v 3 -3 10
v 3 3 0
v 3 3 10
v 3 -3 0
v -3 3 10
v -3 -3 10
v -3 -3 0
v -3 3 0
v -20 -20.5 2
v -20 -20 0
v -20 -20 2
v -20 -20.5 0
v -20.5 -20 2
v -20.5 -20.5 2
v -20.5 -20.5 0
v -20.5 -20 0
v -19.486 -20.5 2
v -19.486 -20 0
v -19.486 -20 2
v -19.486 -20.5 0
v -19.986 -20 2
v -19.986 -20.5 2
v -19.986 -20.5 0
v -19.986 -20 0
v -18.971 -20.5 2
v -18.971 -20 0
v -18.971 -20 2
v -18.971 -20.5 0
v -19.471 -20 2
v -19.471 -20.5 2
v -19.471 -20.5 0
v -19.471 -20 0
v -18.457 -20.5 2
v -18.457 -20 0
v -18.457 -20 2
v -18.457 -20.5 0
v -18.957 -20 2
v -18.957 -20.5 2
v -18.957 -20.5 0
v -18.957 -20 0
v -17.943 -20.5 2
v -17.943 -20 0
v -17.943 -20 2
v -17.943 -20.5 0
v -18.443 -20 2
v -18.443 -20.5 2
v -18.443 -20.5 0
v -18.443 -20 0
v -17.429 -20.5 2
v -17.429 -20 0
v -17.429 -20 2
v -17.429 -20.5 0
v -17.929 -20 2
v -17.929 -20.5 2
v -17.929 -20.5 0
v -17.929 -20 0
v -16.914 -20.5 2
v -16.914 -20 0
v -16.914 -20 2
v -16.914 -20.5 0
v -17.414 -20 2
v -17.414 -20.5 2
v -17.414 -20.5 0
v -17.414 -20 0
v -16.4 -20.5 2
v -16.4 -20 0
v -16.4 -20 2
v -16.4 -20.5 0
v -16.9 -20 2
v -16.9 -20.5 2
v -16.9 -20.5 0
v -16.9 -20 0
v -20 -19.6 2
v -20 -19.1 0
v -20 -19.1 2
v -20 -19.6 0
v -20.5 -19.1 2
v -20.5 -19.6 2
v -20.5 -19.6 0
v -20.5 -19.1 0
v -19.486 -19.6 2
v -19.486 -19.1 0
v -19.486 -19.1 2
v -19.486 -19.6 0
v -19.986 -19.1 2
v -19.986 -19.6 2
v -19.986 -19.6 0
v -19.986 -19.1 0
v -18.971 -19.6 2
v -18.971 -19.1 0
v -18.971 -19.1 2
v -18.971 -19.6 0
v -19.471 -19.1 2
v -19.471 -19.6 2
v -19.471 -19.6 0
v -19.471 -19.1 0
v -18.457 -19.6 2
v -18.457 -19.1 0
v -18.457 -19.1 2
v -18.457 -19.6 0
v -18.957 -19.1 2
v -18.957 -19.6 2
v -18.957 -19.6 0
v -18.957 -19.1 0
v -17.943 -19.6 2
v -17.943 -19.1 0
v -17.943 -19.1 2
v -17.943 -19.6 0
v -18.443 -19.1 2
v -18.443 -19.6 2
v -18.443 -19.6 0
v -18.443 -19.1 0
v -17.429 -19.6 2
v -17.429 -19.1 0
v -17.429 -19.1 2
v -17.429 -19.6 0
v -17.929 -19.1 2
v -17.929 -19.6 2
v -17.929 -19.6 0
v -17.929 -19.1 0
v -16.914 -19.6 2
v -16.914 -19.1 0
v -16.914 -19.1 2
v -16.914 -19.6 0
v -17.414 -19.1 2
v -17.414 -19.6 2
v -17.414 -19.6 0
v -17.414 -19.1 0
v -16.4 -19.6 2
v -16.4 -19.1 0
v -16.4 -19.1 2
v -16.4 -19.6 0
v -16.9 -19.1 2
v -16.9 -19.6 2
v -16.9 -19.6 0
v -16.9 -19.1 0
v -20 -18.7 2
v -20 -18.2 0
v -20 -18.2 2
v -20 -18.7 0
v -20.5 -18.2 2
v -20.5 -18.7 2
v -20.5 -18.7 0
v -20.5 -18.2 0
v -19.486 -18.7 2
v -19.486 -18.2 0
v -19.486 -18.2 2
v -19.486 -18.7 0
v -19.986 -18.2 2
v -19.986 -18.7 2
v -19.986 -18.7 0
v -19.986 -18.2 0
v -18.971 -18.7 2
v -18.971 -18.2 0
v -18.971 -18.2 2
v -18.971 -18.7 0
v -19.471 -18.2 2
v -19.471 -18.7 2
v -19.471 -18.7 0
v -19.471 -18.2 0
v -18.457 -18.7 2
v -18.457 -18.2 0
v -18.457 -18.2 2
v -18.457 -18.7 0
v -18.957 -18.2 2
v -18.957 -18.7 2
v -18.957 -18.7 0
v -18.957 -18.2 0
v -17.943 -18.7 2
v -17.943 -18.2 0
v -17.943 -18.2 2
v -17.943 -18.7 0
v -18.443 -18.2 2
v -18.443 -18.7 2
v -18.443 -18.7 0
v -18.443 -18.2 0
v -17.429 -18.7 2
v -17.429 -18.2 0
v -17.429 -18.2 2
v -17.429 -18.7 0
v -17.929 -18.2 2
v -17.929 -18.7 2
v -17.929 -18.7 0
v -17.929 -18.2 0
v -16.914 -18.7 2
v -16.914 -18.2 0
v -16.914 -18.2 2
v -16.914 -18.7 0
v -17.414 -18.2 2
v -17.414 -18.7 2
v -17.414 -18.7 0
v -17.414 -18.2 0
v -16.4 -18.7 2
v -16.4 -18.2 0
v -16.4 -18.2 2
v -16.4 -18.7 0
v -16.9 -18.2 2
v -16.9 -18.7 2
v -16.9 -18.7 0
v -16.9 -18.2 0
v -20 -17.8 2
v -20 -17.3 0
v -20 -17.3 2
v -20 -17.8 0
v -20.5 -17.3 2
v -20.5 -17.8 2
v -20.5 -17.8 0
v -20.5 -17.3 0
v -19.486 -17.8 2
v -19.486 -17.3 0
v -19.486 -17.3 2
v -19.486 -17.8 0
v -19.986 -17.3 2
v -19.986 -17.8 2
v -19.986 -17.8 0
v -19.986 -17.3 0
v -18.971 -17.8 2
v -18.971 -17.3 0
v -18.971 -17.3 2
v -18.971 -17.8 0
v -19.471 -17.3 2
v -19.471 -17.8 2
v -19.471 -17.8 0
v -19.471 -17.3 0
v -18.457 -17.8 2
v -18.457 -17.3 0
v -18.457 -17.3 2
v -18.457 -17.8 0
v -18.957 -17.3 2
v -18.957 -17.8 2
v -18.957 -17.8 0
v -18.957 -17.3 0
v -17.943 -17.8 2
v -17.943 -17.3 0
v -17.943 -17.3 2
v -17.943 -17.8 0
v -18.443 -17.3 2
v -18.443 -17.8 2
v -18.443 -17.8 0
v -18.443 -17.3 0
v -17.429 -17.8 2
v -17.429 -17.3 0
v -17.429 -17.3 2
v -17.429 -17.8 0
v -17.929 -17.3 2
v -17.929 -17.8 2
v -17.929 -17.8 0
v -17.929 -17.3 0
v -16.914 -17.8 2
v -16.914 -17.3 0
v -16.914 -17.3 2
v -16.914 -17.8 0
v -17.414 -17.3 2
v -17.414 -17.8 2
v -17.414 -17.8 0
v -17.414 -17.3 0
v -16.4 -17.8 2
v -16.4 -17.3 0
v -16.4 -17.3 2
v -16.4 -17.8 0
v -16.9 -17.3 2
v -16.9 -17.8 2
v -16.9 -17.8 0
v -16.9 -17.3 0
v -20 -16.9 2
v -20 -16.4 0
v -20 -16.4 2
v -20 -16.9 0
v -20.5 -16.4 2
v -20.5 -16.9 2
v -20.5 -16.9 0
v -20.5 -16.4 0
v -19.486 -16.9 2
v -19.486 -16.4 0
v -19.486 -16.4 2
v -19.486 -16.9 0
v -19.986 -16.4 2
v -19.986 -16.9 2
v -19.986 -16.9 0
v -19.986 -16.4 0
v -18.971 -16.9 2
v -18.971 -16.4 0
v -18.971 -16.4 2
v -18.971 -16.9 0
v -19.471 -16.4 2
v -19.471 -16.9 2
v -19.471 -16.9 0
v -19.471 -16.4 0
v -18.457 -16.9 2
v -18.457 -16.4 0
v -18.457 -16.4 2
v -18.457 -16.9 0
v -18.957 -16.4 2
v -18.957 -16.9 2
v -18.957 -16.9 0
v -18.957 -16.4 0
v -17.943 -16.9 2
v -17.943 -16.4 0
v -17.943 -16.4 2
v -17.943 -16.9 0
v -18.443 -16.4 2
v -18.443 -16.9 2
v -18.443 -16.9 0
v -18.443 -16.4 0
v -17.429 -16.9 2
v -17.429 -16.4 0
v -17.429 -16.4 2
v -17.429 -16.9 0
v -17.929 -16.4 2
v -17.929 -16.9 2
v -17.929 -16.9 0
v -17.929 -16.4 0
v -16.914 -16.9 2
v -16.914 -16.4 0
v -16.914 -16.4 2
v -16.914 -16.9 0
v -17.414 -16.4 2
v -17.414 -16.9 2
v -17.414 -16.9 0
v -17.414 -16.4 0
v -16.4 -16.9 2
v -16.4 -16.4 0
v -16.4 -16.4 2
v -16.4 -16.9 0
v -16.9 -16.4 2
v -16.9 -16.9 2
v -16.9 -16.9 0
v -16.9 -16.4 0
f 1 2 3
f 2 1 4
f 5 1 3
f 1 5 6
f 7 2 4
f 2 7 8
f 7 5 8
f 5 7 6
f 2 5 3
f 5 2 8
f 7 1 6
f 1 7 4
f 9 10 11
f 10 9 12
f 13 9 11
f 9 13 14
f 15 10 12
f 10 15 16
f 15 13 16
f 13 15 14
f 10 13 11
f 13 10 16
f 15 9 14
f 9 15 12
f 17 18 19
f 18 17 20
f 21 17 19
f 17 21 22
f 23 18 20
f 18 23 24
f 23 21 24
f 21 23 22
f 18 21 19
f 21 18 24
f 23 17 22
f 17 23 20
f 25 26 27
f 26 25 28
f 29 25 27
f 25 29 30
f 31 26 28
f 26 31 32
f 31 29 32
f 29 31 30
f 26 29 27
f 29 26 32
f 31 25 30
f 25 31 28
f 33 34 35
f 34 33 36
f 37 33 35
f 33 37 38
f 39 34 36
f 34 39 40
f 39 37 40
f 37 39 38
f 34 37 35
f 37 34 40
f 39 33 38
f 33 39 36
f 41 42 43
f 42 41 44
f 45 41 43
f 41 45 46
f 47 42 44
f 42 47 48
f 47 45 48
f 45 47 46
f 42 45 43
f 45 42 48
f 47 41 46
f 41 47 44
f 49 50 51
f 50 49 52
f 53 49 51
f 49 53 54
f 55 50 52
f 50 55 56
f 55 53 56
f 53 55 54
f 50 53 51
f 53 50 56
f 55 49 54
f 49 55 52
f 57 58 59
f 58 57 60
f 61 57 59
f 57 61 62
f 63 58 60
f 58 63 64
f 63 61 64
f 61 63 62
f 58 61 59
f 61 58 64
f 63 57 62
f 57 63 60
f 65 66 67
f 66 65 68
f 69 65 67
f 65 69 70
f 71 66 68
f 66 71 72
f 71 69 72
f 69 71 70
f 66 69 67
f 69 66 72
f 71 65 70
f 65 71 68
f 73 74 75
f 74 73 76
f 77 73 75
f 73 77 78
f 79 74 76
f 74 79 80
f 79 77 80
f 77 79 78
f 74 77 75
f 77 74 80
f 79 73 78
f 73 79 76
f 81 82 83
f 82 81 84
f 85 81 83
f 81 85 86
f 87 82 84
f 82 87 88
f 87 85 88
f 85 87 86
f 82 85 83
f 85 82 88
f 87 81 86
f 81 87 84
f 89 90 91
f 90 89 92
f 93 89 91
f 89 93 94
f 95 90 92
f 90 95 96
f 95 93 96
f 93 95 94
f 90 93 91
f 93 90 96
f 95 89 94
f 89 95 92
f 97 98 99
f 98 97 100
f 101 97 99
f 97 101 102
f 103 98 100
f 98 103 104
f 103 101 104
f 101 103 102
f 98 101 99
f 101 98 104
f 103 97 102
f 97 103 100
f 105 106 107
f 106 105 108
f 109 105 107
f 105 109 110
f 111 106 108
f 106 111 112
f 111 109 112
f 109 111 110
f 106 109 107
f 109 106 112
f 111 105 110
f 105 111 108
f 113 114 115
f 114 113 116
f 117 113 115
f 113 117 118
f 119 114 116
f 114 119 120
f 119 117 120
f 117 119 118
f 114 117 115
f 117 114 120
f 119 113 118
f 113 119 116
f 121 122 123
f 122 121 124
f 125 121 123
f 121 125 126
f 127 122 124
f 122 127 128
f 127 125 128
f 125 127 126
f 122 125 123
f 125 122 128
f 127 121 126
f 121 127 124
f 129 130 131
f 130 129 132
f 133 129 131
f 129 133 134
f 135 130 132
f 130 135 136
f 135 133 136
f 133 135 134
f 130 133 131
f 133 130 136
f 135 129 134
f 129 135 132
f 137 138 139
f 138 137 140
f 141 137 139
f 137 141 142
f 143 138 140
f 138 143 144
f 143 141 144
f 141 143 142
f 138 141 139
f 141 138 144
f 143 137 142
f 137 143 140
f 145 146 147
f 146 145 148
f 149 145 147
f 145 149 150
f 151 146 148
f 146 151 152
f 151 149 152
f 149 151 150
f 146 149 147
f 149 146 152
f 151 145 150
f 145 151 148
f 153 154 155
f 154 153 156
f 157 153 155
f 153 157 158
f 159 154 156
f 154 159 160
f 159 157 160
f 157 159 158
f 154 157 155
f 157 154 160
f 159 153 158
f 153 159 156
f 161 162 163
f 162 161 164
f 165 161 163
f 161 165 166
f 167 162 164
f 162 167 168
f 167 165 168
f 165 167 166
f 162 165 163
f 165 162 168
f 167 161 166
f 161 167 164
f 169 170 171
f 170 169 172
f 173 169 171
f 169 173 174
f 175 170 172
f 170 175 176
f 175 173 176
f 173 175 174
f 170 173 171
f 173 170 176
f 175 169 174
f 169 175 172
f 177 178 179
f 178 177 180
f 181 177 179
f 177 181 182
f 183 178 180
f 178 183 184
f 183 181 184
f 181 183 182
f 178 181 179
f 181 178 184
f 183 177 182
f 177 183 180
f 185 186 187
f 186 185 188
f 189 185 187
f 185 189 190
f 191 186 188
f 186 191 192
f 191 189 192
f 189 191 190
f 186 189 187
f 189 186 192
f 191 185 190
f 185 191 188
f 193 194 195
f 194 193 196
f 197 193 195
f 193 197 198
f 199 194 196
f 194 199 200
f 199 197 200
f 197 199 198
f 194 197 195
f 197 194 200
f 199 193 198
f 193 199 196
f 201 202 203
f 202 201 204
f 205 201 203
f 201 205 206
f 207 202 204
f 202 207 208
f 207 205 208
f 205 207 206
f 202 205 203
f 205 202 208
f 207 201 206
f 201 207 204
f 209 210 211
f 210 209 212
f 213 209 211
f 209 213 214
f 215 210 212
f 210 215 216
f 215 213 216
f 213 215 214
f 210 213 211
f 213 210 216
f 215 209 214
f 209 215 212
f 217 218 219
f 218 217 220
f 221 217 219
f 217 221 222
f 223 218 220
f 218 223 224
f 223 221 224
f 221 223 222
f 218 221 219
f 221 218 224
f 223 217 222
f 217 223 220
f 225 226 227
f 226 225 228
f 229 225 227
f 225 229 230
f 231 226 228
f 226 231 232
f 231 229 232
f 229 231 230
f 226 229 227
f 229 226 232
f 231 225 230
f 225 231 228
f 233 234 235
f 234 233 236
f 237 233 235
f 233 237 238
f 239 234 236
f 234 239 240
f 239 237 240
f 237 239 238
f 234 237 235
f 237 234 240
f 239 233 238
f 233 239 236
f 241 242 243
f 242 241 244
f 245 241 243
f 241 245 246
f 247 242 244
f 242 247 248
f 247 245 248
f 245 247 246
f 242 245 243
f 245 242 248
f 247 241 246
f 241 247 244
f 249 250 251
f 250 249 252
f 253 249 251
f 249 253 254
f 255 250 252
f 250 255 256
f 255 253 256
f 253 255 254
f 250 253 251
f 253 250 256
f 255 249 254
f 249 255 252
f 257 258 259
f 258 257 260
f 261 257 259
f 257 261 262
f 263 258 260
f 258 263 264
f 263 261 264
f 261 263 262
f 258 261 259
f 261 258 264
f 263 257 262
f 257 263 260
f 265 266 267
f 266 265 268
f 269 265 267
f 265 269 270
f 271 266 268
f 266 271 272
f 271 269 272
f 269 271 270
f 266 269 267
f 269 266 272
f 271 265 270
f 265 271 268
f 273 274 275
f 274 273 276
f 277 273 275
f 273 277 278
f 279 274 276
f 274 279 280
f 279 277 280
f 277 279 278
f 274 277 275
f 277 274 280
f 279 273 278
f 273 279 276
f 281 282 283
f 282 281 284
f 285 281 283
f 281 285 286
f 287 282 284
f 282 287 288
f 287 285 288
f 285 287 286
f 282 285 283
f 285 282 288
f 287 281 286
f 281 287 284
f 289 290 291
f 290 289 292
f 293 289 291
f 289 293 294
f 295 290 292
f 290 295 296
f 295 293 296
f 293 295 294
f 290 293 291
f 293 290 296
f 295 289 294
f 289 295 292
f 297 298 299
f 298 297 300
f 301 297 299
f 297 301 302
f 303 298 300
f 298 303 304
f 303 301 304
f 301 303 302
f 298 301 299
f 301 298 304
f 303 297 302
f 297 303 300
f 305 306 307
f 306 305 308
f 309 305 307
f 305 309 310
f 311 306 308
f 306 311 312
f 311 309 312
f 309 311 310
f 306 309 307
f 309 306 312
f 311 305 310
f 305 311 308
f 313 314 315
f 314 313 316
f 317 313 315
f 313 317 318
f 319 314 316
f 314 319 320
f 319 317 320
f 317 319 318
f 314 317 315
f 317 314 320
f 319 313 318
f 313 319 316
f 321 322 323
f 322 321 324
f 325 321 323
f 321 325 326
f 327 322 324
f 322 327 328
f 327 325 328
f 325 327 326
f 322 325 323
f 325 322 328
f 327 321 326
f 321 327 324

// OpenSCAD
translate([0, 0, 5]) color([0,1,0,0.9]) cube([6, 6, 10], center=true);
translate([-20.25, -20.25, 1]) color([1,0,0]) cube([0.5, 0.5, 2], center=true);
translate([-19.735714, -20.25, 1]) color([1,0,0]) cube([0.5, 0.5, 2], center=true);
translate([-19.221429, -20.25, 1]) color([1,0,0]) cube([0.5, 0.5, 2], center=true);
translate([-18.707143, -20.25, 1]) color([1,0,0]) cube([0.5, 0.5, 2], center=true);
translate([-18.192857, -20.25, 1]) color([1,0,0]) cube([0.5, 0.5, 2], center=true);
translate([-17.678571, -20.25, 1]) color([1,0,0]) cube([0.5, 0.5, 2], center=true);
translate([-17.164286, -20.25, 1]) color([1,0,0]) cube([0.5, 0.5, 2], center=true);
translate([-16.65, -20.25, 1]) color([1,0,0]) cube([0.5, 0.5, 2], center=true);
translate([-20.25, -19.35, 1]) color([1,0,0]) cube([0.5, 0.5, 2], center=true);
translate([-19.735714, -19.35, 1]) color([1,0,0]) cube([0.5, 0.5, 2], center=true);
translate([-19.221429, -19.35, 1]) color([1,0,0]) cube([0.5, 0.5, 2], center=true);
translate([-18.707143, -19.35, 1]) color([1,0,0]) cube([0.5, 0.5, 2], center=true);
translate([-18.192857, -19.35, 1]) color([1,0,0]) cube([0.5, 0.5, 2], center=true);
translate([-17.678571, -19.35, 1]) color([1,0,0]) cube([0.5, 0.5, 2], center=true);
translate([-17.164286, -19.35, 1]) color([1,0,0]) cube([0.5, 0.5, 2], center=true);
translate([-16.65, -19.35, 1]) color([1,0,0]) cube([0.5, 0.5, 2], center=true);
translate([-20.25, -18.45, 1]) color([1,0,0]) cube([0.5, 0.5, 2], center=true);
translate([-19.735714, -18.45, 1]) color([1,0,0]) cube([0.5, 0.5, 2], center=true);
translate([-19.221429, -18.45, 1]) color([1,0,0]) cube([0.5, 0.5, 2], center=true);
translate([-18.707143, -18.45, 1]) color([1,0,0]) cube([0.5, 0.5, 2], center=true);
translate([-18.192857, -18.45, 1]) color([1,0,0]) cube([0.5, 0.5, 2], center=true);
translate([-17.678571, -18.45, 1]) color([1,0,0]) cube([0.5, 0.5, 2], center=true);
translate([-17.164286, -18.45, 1]) color([1,0,0]) cube([0.5, 0.5, 2], center=true);
translate([-16.65, -18.45, 1]) color([1,0,0]) cube([0.5, 0.5, 2], center=true);
translate([-20.25, -17.55, 1]) color([1,0,0]) cube([0.5, 0.5, 2], center=true);
translate([-19.735714, -17.55, 1]) color([1,0,0]) cube([0.5, 0.5, 2], center=true);
translate([-19.221429, -17.55, 1]) color([1,0,0]) cube([0.5, 0.5, 2], center=true);
translate([-18.707143, -17.55, 1]) color([1,0,0]) cube([0.5, 0.5, 2], center=true);
translate([-18.192857, -17.55, 1]) color([1,0,0]) cube([0.5, 0.5, 2], center=true);
translate([-17.678571, -17.55, 1]) color([1,0,0]) cube([0.5, 0.5, 2], center=true);
translate([-17.164286, -17.55, 1]) color([1,0,0]) cube([0.5, 0.5, 2], center=true);
translate([-16.65, -17.55, 1]) color([1,0,0]) cube([0.5, 0.5, 2], center=true);
translate([-20.25, -16.65, 1]) color([1,0,0]) cube([0.5, 0.5, 2], center=true);
translate([-19.735714, -16.65, 1]) color([1,0,0]) cube([0.5, 0.5, 2], center=true);
translate([-19.221429, -16.65, 1]) color([1,0,0]) cube([0.5, 0.5, 2], center=true);
translate([-18.707143, -16.65, 1]) color([1,0,0]) cube([0.5, 0.5, 2], center=true);
translate([-18.192857, -16.65, 1]) color([1,0,0]) cube([0.5, 0.5, 2], center=true);
translate([-17.678571, -16.65, 1]) color([1,0,0]) cube([0.5, 0.5, 2], center=true);
translate([-17.164286, -16.65, 1]) color([1,0,0]) cube([0.5, 0.5, 2], center=true);
translate([-16.65, -16.65, 1]) color([1,0,0]) cube([0.5, 0.5, 2], center=true);
